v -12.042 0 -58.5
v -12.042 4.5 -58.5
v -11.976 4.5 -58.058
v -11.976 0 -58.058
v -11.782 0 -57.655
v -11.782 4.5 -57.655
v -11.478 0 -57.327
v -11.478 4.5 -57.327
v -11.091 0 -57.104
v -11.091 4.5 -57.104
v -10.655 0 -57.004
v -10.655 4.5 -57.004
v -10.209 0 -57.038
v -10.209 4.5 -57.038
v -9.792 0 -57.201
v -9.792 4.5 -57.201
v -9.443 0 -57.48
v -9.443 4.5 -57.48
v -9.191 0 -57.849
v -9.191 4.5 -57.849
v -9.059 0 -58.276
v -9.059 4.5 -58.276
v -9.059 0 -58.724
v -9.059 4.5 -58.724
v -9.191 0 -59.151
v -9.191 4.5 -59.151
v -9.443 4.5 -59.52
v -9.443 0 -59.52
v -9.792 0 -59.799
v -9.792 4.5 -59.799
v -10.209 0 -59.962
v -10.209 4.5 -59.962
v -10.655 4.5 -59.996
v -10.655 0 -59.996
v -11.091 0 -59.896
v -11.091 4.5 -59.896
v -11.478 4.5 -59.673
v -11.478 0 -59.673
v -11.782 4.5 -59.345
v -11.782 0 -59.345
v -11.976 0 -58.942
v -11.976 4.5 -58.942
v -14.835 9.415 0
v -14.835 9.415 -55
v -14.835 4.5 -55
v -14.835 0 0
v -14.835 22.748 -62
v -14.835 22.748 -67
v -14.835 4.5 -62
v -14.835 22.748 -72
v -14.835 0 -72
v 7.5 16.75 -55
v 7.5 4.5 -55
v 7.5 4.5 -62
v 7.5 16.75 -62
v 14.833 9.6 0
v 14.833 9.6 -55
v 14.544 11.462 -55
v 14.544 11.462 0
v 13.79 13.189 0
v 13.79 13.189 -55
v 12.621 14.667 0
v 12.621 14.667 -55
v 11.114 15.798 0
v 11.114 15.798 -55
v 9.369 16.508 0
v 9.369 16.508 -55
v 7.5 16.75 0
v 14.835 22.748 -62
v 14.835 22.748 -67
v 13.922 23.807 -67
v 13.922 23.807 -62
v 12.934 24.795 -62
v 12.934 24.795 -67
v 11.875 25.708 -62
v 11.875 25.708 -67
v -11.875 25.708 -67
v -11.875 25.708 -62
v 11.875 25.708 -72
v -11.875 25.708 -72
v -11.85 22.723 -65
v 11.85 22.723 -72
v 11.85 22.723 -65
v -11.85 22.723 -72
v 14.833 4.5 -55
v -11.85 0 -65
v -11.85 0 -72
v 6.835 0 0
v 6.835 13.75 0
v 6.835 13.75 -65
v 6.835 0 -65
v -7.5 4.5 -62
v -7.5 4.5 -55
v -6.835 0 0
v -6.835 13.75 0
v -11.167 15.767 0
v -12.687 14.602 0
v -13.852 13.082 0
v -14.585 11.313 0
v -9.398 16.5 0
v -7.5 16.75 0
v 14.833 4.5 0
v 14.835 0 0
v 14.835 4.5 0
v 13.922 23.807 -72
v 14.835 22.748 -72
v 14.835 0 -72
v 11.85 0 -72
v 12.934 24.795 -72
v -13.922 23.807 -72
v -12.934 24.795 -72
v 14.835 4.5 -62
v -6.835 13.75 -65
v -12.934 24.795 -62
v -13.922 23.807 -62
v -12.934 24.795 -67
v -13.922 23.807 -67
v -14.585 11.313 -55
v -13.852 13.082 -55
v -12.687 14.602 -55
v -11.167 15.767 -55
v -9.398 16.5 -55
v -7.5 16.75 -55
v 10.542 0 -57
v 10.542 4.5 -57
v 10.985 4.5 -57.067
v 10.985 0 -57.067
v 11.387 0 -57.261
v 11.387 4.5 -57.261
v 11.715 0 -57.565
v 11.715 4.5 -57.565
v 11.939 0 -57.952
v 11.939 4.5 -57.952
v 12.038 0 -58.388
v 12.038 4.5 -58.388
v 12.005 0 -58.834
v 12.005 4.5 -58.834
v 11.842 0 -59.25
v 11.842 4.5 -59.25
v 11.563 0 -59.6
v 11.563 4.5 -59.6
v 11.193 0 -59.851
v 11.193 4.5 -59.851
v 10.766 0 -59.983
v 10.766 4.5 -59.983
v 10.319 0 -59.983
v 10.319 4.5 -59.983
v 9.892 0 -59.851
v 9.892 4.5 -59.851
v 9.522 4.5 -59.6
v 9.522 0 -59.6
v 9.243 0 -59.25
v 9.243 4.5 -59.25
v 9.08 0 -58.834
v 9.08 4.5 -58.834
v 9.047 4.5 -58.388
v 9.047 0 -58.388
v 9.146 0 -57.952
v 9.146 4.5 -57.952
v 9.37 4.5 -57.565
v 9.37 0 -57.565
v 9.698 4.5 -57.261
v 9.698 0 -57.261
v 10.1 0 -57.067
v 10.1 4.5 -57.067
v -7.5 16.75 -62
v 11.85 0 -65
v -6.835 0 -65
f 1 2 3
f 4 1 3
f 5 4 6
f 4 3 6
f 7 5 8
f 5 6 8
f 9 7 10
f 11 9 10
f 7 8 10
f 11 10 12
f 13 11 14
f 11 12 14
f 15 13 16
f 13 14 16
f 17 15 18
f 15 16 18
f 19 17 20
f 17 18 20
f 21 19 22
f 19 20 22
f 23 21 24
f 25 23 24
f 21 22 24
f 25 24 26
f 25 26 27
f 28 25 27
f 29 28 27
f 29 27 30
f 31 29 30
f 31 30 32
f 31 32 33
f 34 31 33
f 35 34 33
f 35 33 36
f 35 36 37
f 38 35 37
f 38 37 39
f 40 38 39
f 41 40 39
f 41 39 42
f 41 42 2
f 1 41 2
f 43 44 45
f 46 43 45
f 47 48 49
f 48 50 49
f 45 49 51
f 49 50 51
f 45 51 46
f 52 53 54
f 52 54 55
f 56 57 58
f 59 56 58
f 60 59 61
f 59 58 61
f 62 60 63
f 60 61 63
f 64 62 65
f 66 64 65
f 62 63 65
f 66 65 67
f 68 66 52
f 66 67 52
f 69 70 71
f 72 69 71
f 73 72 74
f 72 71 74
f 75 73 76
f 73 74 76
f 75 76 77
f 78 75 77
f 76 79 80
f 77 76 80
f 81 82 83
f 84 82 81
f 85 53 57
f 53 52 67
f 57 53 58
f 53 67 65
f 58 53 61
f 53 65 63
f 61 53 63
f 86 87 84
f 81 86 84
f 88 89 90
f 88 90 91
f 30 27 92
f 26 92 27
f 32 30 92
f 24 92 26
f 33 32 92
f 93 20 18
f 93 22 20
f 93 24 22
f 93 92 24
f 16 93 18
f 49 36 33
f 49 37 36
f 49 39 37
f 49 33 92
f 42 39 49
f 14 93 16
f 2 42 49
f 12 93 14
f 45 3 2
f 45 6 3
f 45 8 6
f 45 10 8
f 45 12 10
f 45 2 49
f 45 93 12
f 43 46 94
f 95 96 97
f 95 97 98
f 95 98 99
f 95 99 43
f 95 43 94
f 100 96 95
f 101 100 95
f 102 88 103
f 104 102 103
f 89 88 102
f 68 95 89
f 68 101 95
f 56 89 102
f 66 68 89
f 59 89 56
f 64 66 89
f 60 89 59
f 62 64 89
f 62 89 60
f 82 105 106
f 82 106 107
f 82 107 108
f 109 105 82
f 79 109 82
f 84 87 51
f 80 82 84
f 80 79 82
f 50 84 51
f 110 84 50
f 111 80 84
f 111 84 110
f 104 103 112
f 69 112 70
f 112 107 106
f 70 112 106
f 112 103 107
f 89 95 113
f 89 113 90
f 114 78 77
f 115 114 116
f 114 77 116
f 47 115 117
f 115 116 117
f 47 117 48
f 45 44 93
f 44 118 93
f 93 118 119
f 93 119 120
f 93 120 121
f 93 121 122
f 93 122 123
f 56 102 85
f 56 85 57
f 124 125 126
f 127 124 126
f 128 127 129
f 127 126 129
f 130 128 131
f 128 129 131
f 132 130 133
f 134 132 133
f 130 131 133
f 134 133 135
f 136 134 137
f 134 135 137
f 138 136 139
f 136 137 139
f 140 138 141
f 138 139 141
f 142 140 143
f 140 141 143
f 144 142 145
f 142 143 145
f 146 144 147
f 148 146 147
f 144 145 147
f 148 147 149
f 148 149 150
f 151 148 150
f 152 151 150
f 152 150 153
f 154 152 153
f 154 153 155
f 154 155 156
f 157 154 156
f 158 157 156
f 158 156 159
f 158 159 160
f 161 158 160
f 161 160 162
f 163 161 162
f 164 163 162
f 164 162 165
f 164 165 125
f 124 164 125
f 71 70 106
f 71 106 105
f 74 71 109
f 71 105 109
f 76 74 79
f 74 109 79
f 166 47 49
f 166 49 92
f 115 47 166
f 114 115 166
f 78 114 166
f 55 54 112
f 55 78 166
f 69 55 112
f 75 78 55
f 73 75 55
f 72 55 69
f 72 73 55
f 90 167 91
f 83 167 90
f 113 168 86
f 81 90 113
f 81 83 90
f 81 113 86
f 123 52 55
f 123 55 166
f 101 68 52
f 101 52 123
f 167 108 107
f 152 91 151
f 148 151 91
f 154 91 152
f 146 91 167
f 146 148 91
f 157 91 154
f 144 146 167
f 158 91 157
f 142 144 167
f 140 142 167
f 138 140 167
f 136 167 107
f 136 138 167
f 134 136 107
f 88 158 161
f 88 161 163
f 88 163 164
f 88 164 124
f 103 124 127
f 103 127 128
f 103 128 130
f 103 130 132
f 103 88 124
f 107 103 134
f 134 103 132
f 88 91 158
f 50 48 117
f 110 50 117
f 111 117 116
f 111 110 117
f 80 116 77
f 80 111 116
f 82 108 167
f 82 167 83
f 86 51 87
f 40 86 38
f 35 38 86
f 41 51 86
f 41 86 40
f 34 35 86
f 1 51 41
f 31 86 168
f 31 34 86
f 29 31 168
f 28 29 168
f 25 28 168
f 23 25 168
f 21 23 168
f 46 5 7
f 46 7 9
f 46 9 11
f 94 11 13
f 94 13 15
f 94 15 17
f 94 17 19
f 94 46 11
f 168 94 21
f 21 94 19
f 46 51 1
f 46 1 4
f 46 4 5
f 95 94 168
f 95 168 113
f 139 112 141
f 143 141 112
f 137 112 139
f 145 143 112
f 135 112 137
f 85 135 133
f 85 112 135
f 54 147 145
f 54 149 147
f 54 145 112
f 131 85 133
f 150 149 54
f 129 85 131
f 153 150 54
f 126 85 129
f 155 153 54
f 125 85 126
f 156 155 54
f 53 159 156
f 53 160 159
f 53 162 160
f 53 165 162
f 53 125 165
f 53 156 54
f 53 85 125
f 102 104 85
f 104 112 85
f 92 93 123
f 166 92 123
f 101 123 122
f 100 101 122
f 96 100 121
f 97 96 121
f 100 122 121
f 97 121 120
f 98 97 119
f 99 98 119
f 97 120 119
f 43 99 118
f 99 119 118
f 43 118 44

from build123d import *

# Parameters (mm, degrees)
BOSS_EXTRUDE1_DEPTH = 72
BOSS_EXTRUDE3_DEPTH = 5
CUT_EXTRUDE4_DEPTH  = 5
BOSS_EXTRUDE4_DEPTH = 5
BOSS_EXTRUDE5_START = 7
BOSS_EXTRUDE5_DEPTH = 55
CUT_EXTRUDE8_DEPTH  = 5
SKETCH19_W          = 15
SKETCH19_H          = 12.25
BOSS_EXTRUDE8_DEPTH = 7
CUT_EXTRUDE9_REACH  = 78.51
SKETCH20_R          = 1.5
SKETCH21_W          = 23.7
SKETCH21_H          = 22.72285099
CUT_EXTRUDE10_DEPTH = 7
SKETCH24_W          = 13.67
SKETCH24_H          = 10.75
CUT_EXTRUDE13_DEPTH = 65


with BuildPart() as part:
    # Sketch1 → Boss-Extrude1 (new body)
    with BuildSketch(Plane.XY):
        Polygon((-14.835, 0), (-6.835, 0), (-6.835, 3), (6.835, 3), (6.835, 0), (14.835, 0), (14.835, 4.5), (8.35, 4.5), (-8.35, 4.5), (-14.835, 4.5), align=None)
    extrude(amount=-BOSS_EXTRUDE1_DEPTH)

    # Sketch8 → Boss-Extrude3 (add)
    with BuildSketch(Plane(origin=(0, 0, -72), x_dir=(-1, 0, 0), z_dir=(0, 0, -1))):
        Polygon((-14.835, 25.70785099), (-14.835, 0), (-10.35, 0), (-10.35, 21.22285099), (10.35, 21.22285099), (10.35, 0), (14.835, 0), (14.835, 25.70785099), align=None)
    extrude(amount=-BOSS_EXTRUDE3_DEPTH)

    # Sketch9 → Cut-Extrude4 (cut)
    with BuildSketch(Plane(origin=(0, 0, -72), x_dir=(-1, 0, 0), z_dir=(0, 0, -1))):
        with BuildLine():
            Line((-15.009070225, 25.881921215), (-15.009070225, 22.527488279))
            ThreePointArc((-15.009070225, 22.527488279), (-13.436955933, 24.309806923), (-11.654637289, 25.881921215))
            Line((-11.654637289, 25.881921215), (-15.009070225, 25.881921215))
        make_face()
        with BuildLine():
            Line((15.009070225, 25.881921215), (15.009070225, 22.527488279))
            ThreePointArc((15.009070225, 22.527488279), (13.436955933, 24.309806923), (11.654637289, 25.881921215))
            Line((11.654637289, 25.881921215), (15.009070225, 25.881921215))
        make_face()
    extrude(amount=-CUT_EXTRUDE4_DEPTH, mode=Mode.SUBTRACT)

    # Sketch11 → Boss-Extrude4 (add)
    with BuildSketch(Plane.XY.offset(-67)):
        with BuildLine():
            Line((14.835, 4.5), (14.835, 22.748275799))
            ThreePointArc((14.835, 22.748275799), (13.436955933, 24.309806923), (11.875424809, 25.70785099))
            Line((11.875424809, 25.70785099), (-11.875424809, 25.70785099))
            ThreePointArc((-11.875424809, 25.70785099), (-13.436955933, 24.309806923), (-14.835, 22.748275799))
            Line((-14.835, 22.748275799), (-14.835, 4.5))
            Line((-14.835, 4.5), (14.835, 4.5))
        make_face()
    extrude(amount=BOSS_EXTRUDE4_DEPTH)

    # Sketch12 → Boss-Extrude5 (add)
    with BuildSketch(Plane.XY.offset(-62).offset(BOSS_EXTRUDE5_START)):
        with BuildLine():
            Line((-14.835, 4.5), (14.832662348, 4.5))
            Line((14.832662348, 4.5), (14.832662348, 9.600169894))
            ThreePointArc((14.832662348, 9.600169894), (12.620742321, 14.666687642), (7.5, 16.75))
            Line((7.5, 16.75), (-7.5, 16.75))
            ThreePointArc((-7.5, 16.75), (-12.68662824, 14.60162824), (-14.835, 9.415))
            Line((-14.835, 9.415), (-14.835, 4.5))
        make_face()
    extrude(amount=BOSS_EXTRUDE5_DEPTH)

    # Sketch18 → Cut-Extrude8 (cut)
    with BuildSketch(Plane(origin=(0, 0, -72), x_dir=(-1, 0, 0), z_dir=(0, 0, -1))):
        Polygon((-10.35, 4.5), (-10.35, 0), (-6.835, 0), (-6.835, 3), (6.835, 3), (6.835, 0), (10.35, 0), (10.35, 4.5), align=None)
    extrude(amount=-CUT_EXTRUDE8_DEPTH, mode=Mode.SUBTRACT)

    # Sketch19 → Boss-Extrude8 (add)
    with BuildSketch(Plane(origin=(0, 0, -55), x_dir=(-1, 0, 0), z_dir=(0, 0, -1))):
        with Locations((0, 10.625)):
            Rectangle(SKETCH19_W, SKETCH19_H)
    extrude(amount=BOSS_EXTRUDE8_DEPTH)

    # Sketch20 → Cut-Extrude9 (cut, up to next)
    with BuildSketch(Plane(origin=(0, 4.5, 0), x_dir=(1, 0, 0), z_dir=(0, 1, 0)), mode=Mode.PRIVATE) as cut_extrude9_sk1:
        with Locations(Location((-10.5425, 58.5, 0), (0, 0, 180))):
            Circle(SKETCH20_R)
    cut_extrude9_tool1 = extrude(cut_extrude9_sk1.sketch, amount=-CUT_EXTRUDE9_REACH, mode=Mode.PRIVATE) & part.part
    # Sketch20 → Cut-Extrude9 (cut, up to next)
    with BuildSketch(Plane(origin=(0, 4.5, 0), x_dir=(1, 0, 0), z_dir=(0, 1, 0)), mode=Mode.PRIVATE) as cut_extrude9_sk2:
        with Locations(Location((10.5425, 58.5, 0), (0, 0, 270))):
            Circle(SKETCH20_R)
    cut_extrude9_tool2 = extrude(cut_extrude9_sk2.sketch, amount=-CUT_EXTRUDE9_REACH, mode=Mode.PRIVATE) & part.part
    add(cut_extrude9_tool1.solids().sort_by_distance((-10.5425, 4.5, -58.5))[0], mode=Mode.SUBTRACT)
    add(cut_extrude9_tool2.solids().sort_by_distance((10.5425, 4.5, -58.5))[0], mode=Mode.SUBTRACT)

    # Sketch21 → Cut-Extrude10 (cut)
    with BuildSketch(Plane(origin=(0, 0, -72), x_dir=(-1, 0, 0), z_dir=(0, 0, -1))):
        with Locations((0, 11.361425495)):
            Rectangle(SKETCH21_W, SKETCH21_H)
    extrude(amount=-CUT_EXTRUDE10_DEPTH, mode=Mode.SUBTRACT)

    # Sketch24 → Cut-Extrude13 (cut)
    with BuildSketch(Plane.XY):
        with Locations((0, 8.375)):
            Rectangle(SKETCH24_W, SKETCH24_H)
    extrude(amount=-CUT_EXTRUDE13_DEPTH, mode=Mode.SUBTRACT)


solid = part.part
